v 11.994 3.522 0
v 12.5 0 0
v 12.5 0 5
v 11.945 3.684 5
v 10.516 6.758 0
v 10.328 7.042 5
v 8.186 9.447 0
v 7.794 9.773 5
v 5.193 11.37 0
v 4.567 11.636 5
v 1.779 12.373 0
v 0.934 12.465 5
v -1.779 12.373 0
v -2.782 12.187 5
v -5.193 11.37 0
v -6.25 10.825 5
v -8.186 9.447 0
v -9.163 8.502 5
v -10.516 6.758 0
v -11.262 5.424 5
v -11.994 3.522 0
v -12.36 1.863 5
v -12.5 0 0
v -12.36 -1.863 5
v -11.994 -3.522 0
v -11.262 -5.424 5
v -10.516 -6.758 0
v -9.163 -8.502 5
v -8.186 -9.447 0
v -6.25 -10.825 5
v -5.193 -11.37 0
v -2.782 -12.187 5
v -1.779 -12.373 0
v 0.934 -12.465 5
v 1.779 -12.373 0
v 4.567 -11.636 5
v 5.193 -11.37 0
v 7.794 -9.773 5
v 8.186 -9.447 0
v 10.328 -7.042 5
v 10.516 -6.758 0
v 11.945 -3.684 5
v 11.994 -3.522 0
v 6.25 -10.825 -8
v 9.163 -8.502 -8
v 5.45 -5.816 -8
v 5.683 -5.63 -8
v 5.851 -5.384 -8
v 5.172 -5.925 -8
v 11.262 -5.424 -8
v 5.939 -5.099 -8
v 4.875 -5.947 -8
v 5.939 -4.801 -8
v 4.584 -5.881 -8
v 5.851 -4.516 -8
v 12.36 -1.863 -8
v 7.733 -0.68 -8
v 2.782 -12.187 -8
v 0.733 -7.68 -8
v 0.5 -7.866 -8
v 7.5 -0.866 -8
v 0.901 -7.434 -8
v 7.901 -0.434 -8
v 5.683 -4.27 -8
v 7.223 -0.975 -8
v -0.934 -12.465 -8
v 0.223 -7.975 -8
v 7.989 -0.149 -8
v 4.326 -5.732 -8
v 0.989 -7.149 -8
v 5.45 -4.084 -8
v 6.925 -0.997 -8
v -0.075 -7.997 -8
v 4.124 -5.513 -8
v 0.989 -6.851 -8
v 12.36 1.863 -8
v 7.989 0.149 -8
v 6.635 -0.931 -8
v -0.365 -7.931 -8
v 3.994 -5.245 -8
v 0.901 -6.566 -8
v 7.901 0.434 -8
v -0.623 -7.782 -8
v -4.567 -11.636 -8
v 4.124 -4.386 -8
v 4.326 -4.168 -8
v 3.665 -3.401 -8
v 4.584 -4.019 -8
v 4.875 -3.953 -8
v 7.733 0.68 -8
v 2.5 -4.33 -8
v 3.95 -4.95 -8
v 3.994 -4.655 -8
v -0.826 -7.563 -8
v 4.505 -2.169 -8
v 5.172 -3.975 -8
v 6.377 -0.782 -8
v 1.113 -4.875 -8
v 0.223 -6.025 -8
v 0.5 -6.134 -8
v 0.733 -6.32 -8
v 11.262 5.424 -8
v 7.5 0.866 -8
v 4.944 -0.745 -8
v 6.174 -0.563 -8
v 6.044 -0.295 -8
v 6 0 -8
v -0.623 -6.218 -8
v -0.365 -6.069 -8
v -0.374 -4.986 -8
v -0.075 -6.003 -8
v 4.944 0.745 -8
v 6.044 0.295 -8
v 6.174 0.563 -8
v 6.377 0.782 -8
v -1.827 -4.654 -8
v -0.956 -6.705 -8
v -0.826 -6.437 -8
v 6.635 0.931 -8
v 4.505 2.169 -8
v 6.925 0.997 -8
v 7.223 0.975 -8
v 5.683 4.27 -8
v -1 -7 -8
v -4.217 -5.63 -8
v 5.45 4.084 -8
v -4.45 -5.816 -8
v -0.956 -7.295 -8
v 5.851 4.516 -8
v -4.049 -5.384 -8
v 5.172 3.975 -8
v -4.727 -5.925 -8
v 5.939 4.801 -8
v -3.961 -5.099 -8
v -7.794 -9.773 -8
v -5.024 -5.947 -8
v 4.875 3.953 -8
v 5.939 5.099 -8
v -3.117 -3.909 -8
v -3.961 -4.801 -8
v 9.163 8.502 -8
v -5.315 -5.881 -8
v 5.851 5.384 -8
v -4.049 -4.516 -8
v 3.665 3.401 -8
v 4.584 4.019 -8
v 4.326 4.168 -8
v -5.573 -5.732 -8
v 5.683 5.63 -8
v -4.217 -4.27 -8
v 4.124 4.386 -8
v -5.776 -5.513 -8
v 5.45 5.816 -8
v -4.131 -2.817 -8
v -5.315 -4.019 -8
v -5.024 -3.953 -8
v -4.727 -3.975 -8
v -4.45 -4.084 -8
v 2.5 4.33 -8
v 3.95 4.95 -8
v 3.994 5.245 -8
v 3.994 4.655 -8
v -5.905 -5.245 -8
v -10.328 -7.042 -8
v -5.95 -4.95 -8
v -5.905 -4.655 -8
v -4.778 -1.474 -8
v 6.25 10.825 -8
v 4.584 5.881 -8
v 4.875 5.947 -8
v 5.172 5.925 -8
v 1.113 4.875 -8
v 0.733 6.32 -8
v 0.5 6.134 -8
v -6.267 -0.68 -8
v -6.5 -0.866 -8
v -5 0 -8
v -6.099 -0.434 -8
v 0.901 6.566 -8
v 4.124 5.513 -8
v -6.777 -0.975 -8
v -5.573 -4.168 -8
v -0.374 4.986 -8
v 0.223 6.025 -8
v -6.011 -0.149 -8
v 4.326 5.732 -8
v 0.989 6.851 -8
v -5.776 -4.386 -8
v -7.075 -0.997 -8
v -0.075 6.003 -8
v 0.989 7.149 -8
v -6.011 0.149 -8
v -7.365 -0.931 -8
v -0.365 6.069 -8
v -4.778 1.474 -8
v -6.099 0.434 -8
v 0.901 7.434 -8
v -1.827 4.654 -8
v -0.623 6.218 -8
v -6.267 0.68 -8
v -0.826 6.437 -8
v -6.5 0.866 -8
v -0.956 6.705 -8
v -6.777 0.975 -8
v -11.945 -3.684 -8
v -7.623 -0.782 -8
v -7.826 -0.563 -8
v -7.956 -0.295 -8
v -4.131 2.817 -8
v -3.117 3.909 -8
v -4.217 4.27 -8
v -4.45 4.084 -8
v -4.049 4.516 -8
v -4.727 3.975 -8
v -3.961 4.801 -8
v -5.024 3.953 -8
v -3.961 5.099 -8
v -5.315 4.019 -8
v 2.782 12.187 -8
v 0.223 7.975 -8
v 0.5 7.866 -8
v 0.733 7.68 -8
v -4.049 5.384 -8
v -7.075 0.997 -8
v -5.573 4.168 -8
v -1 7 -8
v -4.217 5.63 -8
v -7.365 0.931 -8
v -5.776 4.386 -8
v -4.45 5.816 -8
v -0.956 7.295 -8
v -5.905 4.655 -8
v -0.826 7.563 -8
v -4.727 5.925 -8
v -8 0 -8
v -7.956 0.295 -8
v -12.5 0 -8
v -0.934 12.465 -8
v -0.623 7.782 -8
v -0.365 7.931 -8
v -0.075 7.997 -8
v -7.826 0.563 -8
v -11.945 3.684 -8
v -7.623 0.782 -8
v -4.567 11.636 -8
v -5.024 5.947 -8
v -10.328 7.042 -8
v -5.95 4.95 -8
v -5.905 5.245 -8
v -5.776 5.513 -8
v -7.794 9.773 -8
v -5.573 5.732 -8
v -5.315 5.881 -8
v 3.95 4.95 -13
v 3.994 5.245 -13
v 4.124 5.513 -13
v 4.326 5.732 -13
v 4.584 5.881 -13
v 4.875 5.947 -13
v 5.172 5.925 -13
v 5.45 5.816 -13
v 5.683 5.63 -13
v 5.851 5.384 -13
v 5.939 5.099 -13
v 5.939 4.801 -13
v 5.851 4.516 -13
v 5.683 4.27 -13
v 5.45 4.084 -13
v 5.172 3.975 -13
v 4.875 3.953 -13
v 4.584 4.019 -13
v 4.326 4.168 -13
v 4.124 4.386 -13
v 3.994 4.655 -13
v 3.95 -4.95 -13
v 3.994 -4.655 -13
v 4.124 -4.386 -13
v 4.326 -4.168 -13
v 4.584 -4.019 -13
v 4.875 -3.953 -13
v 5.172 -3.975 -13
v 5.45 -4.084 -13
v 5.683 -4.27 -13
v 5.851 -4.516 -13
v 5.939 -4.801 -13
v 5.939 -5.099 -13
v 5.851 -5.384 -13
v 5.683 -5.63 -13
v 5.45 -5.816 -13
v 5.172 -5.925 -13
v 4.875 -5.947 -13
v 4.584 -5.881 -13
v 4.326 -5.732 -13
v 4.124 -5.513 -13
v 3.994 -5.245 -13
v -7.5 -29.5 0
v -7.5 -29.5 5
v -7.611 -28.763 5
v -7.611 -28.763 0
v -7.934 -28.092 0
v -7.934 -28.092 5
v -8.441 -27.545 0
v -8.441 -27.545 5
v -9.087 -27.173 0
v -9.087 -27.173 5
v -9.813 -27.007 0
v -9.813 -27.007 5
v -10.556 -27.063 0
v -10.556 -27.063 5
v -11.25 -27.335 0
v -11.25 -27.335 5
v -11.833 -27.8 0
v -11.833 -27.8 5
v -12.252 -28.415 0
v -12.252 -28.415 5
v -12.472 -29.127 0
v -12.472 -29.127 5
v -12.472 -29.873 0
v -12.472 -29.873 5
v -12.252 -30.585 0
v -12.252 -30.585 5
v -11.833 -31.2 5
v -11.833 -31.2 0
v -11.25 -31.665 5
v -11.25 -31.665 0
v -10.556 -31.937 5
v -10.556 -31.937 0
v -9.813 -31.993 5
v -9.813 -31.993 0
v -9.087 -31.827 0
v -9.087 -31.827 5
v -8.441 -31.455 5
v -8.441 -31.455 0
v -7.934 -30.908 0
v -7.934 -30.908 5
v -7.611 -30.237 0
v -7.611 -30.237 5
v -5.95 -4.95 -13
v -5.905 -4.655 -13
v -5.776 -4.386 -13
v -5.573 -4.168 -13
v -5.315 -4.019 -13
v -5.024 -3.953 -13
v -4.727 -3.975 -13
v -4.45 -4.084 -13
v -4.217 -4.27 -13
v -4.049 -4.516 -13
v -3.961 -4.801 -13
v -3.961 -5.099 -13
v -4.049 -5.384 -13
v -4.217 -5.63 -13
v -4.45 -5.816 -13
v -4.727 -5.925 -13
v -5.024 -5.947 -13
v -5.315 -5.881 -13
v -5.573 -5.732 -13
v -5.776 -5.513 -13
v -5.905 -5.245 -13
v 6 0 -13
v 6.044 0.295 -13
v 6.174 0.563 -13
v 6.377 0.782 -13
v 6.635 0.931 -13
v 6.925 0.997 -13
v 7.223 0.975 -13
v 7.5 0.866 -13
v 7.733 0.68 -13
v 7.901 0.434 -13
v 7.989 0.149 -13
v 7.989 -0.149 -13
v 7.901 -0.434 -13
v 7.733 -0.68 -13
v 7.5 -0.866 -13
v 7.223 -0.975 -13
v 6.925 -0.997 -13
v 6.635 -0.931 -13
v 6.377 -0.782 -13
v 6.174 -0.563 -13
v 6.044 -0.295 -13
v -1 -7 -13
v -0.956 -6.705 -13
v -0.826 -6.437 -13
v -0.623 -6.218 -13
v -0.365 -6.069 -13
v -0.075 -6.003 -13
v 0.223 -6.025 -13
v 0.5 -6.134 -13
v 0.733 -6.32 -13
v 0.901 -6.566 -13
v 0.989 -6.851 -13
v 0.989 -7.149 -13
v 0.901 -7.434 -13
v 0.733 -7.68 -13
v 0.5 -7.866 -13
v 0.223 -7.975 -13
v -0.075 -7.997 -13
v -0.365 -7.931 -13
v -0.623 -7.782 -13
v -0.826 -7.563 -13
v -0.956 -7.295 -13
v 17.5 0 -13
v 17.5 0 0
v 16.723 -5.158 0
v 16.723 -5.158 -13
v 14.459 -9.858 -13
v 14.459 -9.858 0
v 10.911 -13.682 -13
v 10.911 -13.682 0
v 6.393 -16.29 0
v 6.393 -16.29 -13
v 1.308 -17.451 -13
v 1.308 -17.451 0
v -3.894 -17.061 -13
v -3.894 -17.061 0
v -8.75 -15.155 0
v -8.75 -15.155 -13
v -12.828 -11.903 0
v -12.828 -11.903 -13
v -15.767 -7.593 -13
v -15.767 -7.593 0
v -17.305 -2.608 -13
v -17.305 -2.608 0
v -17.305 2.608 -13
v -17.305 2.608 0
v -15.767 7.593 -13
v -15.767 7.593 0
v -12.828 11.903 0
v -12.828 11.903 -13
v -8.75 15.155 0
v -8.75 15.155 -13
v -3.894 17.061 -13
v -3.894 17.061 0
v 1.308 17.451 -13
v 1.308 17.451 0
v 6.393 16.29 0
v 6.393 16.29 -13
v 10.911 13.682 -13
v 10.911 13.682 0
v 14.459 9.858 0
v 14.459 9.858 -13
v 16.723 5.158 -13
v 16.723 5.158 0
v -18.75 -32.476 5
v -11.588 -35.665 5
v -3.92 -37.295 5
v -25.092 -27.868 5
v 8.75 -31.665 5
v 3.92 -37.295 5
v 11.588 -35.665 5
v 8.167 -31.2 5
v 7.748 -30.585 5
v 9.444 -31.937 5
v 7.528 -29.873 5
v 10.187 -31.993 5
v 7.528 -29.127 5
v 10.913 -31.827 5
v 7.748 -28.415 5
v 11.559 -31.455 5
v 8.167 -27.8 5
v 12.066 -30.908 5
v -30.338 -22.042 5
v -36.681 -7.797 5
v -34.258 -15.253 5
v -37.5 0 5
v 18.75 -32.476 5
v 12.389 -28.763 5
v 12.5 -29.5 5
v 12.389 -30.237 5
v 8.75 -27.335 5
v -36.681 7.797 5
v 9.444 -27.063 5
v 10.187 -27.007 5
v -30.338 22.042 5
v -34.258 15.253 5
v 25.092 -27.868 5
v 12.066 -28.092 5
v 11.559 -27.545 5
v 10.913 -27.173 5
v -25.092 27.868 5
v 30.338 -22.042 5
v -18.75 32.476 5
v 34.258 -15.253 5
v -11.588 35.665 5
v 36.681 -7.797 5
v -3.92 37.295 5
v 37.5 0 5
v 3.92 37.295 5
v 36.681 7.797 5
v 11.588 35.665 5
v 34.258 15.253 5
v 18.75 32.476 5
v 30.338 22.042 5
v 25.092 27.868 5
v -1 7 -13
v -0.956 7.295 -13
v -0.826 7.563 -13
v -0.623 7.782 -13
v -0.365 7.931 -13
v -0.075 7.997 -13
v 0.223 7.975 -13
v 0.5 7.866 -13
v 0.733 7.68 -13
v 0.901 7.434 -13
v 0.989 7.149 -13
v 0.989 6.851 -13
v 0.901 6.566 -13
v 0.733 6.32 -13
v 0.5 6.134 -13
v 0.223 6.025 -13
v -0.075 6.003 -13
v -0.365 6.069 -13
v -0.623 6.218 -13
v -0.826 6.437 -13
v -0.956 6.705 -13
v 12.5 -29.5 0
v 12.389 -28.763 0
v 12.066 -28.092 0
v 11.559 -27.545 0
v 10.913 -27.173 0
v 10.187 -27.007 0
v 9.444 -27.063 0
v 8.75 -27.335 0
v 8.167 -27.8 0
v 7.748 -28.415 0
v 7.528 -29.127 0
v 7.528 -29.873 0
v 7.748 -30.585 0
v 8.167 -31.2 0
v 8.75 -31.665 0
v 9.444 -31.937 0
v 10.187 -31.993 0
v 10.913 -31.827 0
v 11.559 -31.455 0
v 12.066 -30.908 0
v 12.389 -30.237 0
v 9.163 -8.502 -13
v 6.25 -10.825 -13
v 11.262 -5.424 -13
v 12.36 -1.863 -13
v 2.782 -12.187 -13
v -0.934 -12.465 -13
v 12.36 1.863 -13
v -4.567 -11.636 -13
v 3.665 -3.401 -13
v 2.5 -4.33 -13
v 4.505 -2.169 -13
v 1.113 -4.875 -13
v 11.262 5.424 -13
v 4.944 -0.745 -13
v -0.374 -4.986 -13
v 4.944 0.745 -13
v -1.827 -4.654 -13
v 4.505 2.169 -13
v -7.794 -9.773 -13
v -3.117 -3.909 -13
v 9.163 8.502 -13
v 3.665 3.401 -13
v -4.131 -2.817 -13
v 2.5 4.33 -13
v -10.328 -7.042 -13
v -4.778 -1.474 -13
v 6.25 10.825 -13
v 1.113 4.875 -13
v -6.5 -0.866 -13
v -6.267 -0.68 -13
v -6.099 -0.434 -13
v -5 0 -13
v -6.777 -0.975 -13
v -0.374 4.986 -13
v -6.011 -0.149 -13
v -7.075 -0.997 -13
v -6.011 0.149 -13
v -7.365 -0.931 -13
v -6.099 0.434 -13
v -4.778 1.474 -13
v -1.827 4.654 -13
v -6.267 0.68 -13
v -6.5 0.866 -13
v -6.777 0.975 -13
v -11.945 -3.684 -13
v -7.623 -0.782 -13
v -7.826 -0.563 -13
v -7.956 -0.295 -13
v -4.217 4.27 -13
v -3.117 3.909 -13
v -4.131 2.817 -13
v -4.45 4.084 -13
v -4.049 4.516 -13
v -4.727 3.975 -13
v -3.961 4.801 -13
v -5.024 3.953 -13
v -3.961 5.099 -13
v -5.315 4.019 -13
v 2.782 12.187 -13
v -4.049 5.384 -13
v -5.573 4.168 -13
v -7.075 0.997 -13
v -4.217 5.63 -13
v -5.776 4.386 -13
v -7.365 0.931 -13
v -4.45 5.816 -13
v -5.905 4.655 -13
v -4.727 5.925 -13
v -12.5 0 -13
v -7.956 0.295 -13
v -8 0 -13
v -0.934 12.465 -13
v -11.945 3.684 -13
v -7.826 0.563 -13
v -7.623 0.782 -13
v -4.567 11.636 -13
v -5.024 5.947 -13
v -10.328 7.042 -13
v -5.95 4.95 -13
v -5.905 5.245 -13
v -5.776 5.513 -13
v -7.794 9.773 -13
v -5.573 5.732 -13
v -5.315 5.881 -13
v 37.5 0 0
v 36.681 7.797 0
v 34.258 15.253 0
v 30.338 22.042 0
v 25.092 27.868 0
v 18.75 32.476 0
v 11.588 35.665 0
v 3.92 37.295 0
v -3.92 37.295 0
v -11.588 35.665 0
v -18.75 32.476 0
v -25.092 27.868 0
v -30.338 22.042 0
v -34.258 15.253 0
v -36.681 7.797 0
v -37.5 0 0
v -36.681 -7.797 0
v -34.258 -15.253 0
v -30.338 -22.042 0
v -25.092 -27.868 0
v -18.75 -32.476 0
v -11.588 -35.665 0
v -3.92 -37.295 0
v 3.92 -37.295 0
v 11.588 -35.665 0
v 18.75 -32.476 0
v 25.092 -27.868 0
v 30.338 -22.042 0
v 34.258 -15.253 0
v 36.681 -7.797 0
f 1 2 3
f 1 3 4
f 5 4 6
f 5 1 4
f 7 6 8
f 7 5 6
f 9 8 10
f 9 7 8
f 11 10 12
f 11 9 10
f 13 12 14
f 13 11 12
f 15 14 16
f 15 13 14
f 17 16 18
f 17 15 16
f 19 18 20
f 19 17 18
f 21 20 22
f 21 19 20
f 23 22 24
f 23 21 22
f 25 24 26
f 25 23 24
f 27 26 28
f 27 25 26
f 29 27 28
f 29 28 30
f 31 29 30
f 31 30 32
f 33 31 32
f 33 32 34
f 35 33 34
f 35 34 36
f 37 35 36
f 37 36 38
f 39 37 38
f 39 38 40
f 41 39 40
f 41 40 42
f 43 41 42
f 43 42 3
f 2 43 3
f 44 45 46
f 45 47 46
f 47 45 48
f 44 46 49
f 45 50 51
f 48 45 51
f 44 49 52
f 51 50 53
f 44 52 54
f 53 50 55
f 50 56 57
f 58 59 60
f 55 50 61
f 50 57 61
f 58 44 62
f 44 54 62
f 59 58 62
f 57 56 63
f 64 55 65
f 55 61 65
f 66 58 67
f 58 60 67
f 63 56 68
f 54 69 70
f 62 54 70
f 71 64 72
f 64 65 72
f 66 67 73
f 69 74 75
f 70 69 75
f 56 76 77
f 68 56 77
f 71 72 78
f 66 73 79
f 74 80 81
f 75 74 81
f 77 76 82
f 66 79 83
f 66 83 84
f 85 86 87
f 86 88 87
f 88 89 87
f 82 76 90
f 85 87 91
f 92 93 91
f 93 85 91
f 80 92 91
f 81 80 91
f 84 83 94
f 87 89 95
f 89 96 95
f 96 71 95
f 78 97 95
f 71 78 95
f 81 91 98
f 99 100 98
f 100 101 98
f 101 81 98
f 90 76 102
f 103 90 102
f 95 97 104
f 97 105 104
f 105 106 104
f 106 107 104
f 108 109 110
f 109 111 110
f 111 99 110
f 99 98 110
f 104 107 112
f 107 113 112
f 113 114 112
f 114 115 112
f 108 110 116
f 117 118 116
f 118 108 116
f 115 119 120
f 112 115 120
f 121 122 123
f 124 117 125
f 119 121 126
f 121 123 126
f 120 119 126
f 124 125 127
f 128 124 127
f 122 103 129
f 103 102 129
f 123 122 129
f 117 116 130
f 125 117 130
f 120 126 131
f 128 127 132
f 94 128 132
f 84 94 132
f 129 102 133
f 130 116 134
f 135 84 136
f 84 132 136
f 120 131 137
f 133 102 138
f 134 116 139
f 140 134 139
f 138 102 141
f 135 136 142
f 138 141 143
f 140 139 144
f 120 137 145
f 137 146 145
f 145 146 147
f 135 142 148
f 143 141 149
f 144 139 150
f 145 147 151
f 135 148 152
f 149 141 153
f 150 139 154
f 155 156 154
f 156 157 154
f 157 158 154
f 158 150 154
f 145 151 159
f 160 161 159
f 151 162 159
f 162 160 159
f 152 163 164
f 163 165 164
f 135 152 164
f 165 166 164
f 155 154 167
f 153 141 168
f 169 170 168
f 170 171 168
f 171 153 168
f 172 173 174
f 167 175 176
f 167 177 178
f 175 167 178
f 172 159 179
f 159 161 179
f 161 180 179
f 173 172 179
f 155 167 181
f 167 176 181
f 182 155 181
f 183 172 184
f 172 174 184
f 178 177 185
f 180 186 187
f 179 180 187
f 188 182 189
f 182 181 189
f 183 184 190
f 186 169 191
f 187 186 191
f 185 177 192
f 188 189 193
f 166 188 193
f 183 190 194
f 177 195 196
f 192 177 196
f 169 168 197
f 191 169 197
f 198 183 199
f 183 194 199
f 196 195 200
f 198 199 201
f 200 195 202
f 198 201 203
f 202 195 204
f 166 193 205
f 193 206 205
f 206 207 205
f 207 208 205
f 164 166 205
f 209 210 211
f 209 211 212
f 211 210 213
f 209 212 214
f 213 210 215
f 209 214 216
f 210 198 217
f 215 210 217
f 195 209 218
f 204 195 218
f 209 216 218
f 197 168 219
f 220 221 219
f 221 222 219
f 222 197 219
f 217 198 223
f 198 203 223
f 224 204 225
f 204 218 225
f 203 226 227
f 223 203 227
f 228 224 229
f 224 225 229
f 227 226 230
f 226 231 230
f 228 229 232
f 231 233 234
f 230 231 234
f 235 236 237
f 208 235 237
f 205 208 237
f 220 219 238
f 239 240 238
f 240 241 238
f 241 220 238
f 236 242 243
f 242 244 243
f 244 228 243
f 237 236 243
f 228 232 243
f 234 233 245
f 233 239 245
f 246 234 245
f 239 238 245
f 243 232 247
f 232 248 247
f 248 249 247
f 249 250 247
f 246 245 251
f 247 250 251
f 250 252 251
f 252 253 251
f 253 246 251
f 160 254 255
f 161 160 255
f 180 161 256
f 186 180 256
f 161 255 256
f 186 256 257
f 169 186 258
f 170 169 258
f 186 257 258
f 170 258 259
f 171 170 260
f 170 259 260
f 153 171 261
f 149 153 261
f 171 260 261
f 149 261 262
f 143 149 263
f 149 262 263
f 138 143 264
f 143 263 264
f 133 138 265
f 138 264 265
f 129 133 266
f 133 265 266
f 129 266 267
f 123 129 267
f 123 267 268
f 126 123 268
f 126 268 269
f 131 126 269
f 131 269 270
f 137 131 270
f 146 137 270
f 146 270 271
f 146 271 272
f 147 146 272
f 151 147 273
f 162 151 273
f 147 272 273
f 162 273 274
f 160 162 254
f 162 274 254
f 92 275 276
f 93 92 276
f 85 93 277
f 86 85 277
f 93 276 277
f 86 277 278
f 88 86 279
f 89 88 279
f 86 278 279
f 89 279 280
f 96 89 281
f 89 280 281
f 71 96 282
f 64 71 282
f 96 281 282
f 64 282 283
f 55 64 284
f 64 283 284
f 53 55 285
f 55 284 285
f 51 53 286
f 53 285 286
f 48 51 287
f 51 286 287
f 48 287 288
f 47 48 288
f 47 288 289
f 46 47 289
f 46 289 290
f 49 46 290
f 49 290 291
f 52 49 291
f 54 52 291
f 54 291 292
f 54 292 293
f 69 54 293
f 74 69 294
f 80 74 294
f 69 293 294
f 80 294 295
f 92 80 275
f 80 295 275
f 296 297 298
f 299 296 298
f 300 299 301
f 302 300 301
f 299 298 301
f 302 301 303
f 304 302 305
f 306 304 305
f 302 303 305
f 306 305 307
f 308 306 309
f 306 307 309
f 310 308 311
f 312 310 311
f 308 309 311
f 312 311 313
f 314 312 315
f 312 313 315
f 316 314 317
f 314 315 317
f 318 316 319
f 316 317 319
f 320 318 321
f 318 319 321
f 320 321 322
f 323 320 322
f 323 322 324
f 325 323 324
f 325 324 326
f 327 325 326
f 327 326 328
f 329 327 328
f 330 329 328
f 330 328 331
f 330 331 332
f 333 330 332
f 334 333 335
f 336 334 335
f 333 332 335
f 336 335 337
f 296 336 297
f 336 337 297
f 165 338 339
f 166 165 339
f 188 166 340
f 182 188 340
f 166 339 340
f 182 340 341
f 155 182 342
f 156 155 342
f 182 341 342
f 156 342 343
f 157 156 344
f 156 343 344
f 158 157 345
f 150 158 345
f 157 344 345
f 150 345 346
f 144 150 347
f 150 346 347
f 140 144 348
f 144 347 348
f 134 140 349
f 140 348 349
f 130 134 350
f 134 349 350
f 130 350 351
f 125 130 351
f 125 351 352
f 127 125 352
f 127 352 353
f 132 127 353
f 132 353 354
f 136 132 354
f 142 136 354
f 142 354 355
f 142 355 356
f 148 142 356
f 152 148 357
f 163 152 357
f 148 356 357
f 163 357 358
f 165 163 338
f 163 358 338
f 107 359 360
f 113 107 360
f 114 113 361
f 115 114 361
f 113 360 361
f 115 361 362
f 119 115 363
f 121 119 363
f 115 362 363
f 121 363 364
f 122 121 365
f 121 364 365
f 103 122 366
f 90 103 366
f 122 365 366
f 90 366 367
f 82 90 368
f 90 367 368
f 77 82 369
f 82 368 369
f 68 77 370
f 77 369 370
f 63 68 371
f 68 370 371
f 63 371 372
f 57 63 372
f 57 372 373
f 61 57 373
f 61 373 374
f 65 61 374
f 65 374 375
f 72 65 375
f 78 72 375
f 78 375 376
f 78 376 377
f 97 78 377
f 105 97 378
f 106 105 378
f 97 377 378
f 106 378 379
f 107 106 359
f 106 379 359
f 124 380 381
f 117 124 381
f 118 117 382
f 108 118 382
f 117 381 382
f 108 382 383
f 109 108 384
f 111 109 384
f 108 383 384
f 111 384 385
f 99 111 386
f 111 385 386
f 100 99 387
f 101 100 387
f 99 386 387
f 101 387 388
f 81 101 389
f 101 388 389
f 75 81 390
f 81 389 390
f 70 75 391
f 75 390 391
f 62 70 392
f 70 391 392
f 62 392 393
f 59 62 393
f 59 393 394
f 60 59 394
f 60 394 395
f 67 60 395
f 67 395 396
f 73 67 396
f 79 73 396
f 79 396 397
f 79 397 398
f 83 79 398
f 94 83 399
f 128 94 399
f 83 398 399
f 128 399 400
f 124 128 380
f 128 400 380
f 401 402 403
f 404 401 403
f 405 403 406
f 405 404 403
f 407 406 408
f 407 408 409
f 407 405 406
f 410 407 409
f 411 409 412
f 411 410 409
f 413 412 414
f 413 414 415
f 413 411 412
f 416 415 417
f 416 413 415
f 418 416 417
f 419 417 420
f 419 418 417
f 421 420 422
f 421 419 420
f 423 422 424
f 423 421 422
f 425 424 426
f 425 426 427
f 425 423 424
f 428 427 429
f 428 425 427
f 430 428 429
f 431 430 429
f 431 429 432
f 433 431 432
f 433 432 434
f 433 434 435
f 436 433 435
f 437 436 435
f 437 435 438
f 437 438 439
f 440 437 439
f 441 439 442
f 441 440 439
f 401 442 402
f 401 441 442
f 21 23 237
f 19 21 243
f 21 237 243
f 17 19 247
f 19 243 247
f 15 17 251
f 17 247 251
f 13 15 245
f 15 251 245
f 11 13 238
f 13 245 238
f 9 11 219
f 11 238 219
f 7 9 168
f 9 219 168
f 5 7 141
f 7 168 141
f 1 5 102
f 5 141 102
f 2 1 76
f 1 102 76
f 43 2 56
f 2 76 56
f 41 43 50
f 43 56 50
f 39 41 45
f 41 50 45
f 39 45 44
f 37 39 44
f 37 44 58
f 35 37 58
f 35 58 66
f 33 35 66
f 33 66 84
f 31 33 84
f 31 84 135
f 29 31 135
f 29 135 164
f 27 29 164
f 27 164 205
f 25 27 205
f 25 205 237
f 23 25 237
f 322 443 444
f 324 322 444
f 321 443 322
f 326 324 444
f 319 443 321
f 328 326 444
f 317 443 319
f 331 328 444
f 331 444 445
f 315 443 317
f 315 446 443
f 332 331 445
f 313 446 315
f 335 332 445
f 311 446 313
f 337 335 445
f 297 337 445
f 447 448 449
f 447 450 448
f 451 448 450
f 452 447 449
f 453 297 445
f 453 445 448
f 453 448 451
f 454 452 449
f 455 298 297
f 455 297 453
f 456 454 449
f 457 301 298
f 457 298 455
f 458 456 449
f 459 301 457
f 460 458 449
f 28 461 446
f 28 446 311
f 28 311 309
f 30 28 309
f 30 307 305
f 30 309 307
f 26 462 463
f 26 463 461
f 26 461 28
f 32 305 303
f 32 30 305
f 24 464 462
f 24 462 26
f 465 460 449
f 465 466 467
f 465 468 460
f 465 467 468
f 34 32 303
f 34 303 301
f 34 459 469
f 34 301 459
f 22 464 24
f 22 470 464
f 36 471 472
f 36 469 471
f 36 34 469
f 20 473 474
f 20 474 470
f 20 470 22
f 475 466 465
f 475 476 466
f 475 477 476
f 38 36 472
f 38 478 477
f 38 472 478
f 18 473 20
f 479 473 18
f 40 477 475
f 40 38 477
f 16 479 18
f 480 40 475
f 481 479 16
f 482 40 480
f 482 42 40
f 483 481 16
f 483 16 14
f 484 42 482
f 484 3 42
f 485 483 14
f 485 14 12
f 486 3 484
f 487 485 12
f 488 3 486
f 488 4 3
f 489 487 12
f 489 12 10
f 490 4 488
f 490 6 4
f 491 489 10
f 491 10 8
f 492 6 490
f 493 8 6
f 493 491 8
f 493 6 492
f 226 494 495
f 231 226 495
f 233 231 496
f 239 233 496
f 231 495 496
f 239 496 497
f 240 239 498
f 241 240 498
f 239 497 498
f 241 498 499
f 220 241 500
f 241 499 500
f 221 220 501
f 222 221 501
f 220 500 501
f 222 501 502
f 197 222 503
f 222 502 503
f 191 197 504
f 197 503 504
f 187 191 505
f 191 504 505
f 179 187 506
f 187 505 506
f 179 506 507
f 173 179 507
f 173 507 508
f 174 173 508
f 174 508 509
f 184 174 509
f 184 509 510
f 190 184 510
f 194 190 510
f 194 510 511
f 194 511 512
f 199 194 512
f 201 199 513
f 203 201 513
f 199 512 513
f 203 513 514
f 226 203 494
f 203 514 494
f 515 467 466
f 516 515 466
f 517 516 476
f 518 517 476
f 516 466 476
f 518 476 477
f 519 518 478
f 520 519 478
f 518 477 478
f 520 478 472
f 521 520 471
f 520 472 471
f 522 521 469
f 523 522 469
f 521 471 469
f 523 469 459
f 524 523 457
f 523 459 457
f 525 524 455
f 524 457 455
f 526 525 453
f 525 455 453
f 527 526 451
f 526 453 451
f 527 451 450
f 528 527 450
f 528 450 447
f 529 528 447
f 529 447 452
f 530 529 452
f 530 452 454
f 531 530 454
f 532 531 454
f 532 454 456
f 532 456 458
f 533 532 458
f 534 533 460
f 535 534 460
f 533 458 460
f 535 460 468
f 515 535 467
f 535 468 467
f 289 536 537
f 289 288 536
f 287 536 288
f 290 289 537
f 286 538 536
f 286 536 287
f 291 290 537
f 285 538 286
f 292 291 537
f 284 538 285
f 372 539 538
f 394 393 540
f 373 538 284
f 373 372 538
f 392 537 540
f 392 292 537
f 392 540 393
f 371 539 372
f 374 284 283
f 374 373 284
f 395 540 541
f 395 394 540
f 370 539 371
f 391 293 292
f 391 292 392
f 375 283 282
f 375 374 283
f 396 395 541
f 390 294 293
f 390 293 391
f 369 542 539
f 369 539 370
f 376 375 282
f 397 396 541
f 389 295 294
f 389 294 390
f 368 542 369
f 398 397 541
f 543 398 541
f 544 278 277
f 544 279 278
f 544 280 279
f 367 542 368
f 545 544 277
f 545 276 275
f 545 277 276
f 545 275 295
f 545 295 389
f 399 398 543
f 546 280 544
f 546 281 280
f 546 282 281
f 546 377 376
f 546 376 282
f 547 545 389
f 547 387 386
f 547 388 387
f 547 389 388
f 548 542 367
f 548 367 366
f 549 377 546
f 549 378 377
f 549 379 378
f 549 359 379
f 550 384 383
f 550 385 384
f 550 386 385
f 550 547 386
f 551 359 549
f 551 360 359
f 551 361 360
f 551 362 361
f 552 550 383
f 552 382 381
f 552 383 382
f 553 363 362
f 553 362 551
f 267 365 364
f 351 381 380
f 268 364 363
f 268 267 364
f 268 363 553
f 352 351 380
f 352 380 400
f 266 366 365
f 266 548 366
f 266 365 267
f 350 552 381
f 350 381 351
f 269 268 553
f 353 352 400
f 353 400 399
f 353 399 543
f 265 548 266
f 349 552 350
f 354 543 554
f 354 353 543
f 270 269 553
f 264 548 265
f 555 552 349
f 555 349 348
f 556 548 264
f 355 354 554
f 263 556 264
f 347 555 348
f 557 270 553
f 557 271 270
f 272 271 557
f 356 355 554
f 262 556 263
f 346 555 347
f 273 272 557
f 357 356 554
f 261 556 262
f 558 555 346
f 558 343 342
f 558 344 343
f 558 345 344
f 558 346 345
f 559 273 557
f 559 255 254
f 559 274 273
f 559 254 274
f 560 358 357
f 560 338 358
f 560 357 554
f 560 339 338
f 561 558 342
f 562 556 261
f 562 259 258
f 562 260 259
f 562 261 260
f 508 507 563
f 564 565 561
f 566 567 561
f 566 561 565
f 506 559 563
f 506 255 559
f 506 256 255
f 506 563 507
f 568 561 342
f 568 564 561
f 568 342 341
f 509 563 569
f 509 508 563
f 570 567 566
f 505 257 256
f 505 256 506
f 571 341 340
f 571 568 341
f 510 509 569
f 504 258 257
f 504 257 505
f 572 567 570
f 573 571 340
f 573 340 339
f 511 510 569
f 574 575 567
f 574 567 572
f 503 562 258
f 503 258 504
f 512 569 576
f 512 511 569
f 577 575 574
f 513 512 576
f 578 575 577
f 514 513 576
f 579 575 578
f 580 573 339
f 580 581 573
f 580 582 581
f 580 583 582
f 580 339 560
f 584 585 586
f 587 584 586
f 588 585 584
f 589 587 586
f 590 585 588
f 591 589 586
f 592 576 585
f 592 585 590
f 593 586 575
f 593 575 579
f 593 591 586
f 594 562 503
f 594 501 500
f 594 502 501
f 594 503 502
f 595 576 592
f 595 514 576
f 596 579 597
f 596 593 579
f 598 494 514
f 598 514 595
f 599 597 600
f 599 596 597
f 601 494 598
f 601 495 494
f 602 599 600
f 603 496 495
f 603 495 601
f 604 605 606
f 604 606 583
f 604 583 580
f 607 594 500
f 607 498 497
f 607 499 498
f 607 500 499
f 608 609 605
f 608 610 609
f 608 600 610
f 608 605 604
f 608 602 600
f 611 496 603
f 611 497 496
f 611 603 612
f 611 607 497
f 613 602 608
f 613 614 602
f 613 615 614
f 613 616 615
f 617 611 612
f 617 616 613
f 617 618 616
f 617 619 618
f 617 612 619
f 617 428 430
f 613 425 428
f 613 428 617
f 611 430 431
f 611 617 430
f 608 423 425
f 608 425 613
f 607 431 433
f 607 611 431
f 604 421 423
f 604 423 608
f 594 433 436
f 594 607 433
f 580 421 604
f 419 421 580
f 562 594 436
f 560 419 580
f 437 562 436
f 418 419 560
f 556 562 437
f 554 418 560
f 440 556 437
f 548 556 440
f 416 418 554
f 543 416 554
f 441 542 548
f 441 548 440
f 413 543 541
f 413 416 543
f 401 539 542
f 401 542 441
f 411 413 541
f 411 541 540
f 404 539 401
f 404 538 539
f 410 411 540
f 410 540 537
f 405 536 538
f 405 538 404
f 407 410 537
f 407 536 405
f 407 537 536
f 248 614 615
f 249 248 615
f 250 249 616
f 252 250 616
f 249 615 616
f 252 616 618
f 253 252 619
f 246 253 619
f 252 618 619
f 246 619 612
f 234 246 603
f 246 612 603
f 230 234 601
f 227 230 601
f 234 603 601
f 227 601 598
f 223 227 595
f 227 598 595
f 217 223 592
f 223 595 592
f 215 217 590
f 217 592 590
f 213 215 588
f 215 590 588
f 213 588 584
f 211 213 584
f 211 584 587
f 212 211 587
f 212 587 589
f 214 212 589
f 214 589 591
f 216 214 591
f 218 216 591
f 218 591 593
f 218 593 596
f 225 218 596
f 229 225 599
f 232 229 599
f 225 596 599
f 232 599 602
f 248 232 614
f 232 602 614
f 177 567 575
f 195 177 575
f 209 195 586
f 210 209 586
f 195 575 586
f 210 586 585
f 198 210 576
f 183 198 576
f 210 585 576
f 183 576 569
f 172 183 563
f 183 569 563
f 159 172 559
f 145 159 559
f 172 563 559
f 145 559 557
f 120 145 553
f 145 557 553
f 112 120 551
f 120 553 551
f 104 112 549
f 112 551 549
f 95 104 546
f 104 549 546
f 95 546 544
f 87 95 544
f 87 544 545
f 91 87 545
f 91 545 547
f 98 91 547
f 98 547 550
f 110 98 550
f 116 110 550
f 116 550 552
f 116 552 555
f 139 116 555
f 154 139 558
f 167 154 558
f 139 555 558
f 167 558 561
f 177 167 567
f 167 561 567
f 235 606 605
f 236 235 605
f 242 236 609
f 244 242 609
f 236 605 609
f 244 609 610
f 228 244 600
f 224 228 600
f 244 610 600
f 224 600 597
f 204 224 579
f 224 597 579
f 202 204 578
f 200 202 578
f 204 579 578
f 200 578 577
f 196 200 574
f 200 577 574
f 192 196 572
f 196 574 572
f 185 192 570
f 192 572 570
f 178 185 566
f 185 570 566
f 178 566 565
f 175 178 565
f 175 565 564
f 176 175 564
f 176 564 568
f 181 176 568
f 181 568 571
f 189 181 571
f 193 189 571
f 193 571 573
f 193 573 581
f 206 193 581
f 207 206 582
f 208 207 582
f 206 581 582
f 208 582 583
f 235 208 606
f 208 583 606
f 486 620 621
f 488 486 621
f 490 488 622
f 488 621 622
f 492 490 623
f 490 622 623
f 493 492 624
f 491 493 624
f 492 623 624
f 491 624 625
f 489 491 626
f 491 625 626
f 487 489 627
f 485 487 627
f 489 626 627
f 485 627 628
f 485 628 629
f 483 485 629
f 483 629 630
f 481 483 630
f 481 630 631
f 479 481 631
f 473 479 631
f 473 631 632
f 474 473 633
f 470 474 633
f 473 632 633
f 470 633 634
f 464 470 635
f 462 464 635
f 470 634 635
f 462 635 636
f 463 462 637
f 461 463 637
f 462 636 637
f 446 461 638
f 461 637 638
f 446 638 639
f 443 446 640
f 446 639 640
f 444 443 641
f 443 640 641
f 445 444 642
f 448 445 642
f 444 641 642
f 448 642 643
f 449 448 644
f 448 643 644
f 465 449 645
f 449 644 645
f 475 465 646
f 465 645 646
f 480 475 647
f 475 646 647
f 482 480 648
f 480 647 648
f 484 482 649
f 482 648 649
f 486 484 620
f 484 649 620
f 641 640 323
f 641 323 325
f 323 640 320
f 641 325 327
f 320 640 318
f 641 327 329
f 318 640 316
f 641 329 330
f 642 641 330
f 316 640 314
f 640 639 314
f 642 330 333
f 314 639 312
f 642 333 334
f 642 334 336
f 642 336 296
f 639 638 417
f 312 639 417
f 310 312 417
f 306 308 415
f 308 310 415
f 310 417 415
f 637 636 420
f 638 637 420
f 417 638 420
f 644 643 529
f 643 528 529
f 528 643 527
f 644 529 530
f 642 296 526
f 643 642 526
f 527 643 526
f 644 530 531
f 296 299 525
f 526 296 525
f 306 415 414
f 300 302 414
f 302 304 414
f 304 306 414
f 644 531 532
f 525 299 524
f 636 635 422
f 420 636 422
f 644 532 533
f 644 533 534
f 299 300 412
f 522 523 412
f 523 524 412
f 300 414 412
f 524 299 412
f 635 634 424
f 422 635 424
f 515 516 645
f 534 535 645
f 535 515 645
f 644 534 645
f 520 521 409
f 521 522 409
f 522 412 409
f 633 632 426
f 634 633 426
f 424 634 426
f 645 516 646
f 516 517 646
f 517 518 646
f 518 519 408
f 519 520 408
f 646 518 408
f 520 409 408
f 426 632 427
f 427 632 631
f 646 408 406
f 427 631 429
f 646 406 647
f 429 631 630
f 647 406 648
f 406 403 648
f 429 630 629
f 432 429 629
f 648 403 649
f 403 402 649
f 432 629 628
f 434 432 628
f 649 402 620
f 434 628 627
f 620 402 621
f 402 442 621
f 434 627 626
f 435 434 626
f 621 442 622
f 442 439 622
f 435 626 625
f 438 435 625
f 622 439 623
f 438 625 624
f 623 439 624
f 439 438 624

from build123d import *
from build123d.topology import SkipClean

# Parameters (mm, degrees)
SKETCH_1_R          = 37.5
SKETCH_1_R_2        = 12.5
EXTRUDE_1_DEPTH     = 5
EXTRUDE_START       = 13
SKETCH_2_R          = 17.5
SKETCH_2_R_2        = 12.5
EXTRUDE_2_DEPTH     = 13
SKETCH_3_R          = 12.5
SKETCH_3_R_2        = 5
SKETCH_3_R_3        = 1
EXTRUDE_3_DEPTH     = 5
SKETCH_4_R          = 2.5
CUT_EXTRUDE_1_DEPTH = 5


with BuildPart() as part:
    # 草图1 → 凸台-拉伸1 (new body)
    with BuildSketch(Plane.XY):
        Circle(SKETCH_1_R)
        Circle(SKETCH_1_R_2, mode=Mode.SUBTRACT)
    extrude(amount=EXTRUDE_1_DEPTH)

    # 草图2 → 凸台-拉伸2 (add)
    with SkipClean():  # the faces are left unmerged after this step: merging them gives an invalid solid
        with BuildSketch(Plane(origin=(0, 0, 0), x_dir=(-1, 0, 0), z_dir=(0, 0, -1)).offset(EXTRUDE_START)):
            with Locations(Location((0, 0, 0), (0, 0, 180))):
                Circle(SKETCH_2_R)
            Circle(SKETCH_2_R_2, mode=Mode.SUBTRACT)
        extrude(amount=-EXTRUDE_2_DEPTH)

    # 草图3 → 凸台-拉伸3 (add)
    with SkipClean():  # the faces are left unmerged after this step: merging them gives an invalid solid
        with BuildSketch(Plane(origin=(0, 0, -13), x_dir=(-1, 0, 0), z_dir=(0, 0, -1))):
            Circle(SKETCH_3_R)
            Circle(SKETCH_3_R_2, mode=Mode.SUBTRACT)
            with Locations((7, 0)):
                Circle(SKETCH_3_R_3, mode=Mode.SUBTRACT)
            with Locations((4.949747468, -4.949747468)):
                Circle(SKETCH_3_R_3, mode=Mode.SUBTRACT)
            with Locations((0, -7)):
                Circle(SKETCH_3_R_3, mode=Mode.SUBTRACT)
            with Locations((-4.949747468, -4.949747468)):
                Circle(SKETCH_3_R_3, mode=Mode.SUBTRACT)
            with Locations((-7, 0)):
                Circle(SKETCH_3_R_3, mode=Mode.SUBTRACT)
            with Locations((-4.949747468, 4.949747468)):
                Circle(SKETCH_3_R_3, mode=Mode.SUBTRACT)
            with Locations((0, 7)):
                Circle(SKETCH_3_R_3, mode=Mode.SUBTRACT)
            with Locations((4.949747468, 4.949747468)):
                Circle(SKETCH_3_R_3, mode=Mode.SUBTRACT)
        extrude(amount=-EXTRUDE_3_DEPTH)

    # 草图4 → 切除-拉伸1 (cut)
    with SkipClean():  # the faces are left unmerged after this step: merging them gives an invalid solid
        with BuildSketch(Plane.XY.offset(5)):
            with Locations((10, -29.5)):
                Circle(SKETCH_4_R)
            with Locations((-10, -29.5)):
                Circle(SKETCH_4_R)
        extrude(amount=-CUT_EXTRUDE_1_DEPTH, mode=Mode.SUBTRACT)


solid = part.part
